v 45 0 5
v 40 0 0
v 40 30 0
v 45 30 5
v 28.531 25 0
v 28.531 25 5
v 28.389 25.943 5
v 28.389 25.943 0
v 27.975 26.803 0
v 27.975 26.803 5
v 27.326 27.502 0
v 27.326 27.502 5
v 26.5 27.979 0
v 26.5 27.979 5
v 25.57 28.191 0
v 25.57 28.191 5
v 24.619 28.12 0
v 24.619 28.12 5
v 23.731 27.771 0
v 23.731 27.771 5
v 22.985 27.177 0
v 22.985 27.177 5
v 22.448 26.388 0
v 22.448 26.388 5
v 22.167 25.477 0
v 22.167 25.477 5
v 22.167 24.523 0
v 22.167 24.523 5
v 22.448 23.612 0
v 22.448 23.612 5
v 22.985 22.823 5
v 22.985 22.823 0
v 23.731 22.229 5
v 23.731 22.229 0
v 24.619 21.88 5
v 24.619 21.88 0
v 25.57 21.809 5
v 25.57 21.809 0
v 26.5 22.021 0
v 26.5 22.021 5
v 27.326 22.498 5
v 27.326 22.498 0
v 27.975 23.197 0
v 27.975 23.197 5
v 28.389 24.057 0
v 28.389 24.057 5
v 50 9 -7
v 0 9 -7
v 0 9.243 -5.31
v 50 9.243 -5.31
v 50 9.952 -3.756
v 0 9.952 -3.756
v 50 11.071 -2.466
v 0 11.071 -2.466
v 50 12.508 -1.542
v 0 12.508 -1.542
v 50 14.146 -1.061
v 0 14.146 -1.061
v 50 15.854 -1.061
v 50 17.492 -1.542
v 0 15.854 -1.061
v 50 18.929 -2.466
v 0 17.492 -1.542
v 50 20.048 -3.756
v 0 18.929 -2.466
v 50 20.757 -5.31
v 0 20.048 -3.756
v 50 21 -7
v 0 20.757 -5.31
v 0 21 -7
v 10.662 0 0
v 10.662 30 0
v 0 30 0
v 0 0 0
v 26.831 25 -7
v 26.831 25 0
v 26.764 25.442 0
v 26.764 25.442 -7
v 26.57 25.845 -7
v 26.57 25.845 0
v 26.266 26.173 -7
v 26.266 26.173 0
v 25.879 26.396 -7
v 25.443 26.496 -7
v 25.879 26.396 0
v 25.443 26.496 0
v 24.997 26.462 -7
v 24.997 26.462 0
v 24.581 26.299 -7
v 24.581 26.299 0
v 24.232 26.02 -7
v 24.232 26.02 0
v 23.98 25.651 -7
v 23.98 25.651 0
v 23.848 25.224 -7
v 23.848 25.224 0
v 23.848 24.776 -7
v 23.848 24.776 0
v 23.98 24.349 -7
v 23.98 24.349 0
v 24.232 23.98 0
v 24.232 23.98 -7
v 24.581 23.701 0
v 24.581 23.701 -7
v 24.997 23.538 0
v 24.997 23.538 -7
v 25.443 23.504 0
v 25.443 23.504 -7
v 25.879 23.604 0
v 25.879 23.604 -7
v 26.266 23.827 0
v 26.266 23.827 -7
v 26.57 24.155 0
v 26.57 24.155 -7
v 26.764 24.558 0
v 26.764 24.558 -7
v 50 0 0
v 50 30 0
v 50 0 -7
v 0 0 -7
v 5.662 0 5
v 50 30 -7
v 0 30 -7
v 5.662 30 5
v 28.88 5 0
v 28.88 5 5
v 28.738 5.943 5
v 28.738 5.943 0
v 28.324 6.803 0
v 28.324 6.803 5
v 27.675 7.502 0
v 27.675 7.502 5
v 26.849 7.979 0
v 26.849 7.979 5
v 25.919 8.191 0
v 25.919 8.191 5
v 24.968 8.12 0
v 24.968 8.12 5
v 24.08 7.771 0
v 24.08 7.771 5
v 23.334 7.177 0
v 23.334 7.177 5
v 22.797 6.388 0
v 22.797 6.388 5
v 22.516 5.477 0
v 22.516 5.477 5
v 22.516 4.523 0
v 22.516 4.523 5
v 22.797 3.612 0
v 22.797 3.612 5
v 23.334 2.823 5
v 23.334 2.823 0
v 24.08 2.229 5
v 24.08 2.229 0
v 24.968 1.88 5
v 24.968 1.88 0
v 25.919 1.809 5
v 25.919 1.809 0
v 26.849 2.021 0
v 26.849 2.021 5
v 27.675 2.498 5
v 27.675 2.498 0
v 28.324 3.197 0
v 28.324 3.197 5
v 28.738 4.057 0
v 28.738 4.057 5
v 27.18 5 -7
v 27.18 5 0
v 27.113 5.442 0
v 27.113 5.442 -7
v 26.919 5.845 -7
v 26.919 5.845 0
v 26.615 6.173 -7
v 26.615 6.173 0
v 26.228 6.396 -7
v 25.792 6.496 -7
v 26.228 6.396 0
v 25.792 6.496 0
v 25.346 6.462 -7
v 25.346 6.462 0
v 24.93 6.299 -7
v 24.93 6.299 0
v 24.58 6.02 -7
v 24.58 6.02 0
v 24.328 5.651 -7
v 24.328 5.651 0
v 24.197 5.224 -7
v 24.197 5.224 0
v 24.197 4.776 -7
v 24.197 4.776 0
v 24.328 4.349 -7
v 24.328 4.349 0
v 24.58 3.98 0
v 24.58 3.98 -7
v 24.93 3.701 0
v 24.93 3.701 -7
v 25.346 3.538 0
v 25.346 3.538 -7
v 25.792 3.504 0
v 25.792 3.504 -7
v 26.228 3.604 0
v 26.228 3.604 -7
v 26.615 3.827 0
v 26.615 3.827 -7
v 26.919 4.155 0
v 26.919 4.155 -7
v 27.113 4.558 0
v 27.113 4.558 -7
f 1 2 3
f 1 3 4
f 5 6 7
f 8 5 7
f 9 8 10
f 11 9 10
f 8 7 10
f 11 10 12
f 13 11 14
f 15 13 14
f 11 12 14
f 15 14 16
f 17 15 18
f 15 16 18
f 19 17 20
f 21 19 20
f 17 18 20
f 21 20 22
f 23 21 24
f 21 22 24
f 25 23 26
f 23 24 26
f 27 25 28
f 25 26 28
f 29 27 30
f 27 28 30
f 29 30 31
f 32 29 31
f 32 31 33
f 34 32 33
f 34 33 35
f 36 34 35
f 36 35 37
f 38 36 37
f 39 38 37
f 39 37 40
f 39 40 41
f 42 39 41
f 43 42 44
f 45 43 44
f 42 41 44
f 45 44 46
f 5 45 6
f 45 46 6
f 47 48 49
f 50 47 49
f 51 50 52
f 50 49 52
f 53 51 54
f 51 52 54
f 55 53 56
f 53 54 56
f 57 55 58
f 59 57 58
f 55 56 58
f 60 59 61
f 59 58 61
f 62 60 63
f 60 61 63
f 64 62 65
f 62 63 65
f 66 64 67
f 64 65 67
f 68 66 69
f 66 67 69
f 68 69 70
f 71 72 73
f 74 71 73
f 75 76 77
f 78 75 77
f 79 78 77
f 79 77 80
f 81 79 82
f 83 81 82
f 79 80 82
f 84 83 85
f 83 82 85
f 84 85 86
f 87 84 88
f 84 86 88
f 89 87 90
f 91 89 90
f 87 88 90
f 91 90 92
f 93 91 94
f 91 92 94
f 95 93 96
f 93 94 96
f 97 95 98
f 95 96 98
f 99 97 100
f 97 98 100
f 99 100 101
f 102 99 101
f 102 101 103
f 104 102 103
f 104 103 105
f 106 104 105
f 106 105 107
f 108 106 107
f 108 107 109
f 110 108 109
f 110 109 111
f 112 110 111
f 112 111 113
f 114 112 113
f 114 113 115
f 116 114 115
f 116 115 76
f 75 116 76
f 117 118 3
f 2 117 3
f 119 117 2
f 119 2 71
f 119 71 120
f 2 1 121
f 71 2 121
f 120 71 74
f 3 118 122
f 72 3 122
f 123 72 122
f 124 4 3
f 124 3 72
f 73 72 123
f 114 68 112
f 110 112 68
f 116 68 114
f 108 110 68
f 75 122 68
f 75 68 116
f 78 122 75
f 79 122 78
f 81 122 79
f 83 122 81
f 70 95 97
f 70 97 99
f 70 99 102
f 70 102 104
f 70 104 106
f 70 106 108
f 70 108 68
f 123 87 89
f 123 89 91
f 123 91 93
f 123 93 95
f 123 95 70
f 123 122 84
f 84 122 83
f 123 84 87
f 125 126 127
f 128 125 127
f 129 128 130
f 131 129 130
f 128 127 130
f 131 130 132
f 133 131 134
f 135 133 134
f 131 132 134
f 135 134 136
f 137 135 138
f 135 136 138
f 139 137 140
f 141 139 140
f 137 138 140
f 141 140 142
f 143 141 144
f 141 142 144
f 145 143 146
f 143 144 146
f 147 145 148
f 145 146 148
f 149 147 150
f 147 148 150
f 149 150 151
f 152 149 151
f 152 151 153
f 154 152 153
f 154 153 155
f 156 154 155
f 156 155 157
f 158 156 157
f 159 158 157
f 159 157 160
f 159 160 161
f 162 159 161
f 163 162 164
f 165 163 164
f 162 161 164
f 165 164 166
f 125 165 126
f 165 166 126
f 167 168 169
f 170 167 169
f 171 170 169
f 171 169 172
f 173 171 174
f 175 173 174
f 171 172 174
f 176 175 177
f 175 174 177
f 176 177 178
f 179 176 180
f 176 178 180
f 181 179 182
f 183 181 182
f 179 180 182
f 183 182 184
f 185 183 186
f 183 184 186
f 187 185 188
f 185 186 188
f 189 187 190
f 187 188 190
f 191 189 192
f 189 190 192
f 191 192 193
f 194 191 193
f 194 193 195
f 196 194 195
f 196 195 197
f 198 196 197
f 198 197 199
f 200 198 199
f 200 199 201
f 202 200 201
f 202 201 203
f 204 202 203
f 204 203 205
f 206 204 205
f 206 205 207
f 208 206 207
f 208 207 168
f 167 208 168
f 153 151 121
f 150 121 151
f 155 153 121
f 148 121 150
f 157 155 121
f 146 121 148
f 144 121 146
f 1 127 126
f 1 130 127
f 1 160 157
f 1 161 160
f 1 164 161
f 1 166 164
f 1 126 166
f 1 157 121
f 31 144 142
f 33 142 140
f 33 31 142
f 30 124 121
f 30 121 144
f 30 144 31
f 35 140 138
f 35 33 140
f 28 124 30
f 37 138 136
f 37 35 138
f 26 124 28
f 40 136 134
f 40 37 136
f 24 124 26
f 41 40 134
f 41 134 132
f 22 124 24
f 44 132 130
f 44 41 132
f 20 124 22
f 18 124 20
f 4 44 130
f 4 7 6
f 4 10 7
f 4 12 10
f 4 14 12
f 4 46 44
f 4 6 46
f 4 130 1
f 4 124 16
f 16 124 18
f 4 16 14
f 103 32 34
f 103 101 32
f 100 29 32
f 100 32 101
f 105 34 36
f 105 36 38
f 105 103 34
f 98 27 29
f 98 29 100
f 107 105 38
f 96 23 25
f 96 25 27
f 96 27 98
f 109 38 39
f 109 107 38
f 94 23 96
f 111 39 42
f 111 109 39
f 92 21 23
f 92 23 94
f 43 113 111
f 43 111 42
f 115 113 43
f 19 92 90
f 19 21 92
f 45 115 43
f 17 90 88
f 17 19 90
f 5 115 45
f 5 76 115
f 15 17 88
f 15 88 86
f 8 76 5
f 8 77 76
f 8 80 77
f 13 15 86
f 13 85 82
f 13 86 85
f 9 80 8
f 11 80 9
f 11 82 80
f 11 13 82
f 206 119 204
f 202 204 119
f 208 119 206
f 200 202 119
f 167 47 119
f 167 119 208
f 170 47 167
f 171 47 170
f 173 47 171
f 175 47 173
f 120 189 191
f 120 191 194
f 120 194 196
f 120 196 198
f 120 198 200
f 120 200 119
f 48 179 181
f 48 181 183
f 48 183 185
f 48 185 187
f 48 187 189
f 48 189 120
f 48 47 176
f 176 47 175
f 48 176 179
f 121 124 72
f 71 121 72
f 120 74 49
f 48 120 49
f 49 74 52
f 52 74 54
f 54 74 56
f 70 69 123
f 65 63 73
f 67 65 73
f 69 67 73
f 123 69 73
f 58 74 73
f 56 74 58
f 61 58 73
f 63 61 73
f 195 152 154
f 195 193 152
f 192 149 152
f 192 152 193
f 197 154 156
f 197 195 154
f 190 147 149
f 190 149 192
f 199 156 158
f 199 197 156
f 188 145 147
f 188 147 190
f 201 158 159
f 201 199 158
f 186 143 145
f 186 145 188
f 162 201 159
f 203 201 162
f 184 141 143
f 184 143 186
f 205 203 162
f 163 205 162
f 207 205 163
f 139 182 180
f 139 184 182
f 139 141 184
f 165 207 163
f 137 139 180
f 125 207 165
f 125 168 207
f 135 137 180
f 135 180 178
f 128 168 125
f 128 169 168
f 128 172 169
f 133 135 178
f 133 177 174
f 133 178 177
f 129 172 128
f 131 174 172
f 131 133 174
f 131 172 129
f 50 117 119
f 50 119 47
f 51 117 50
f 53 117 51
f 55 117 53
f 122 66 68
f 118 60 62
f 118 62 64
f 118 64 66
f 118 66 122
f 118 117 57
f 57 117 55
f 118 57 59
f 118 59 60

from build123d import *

# Parameters (mm, degrees)
SKETCH_1_W            = 50
SKETCH_1_H            = 30
EXTRUDE_320_DEPTH     = 5
CUT_EXTRUDE_710_DEPTH = 31
SKETCH_8_W            = 50
SKETCH_8_H            = 30
EXTRUDE_1_DEPTH       = 2
SKETCH_11_R           = 6
CUT_EXTRUDE_2_DEPTH   = 51
SKETCH_12_R           = 1.5
CUT_EXTRUDE_3_DEPTH   = 13
SKETCH_12_3_R         = 3.2
CUT_EXTRUDE_4_DEPTH   = 5


with BuildPart() as part:
    # Эскиз1 → Extrude 320 (new body, symmetric)
    with BuildSketch(Plane.XY):
        with Locations((25, 15)):
            Rectangle(SKETCH_1_W, SKETCH_1_H)
    extrude(amount=EXTRUDE_320_DEPTH, both=True)

    # Эскиз2 → Cut-Extrude 710 (cut, through all)
    with BuildSketch(Plane(origin=(0, 30, 0), x_dir=(1, 0, 0), z_dir=(0, 1, 0))):
        Polygon((10.662267101, 0), (0, 0), (0, -5), (5.662267101, -5), align=None)
        Polygon((40, 0), (45, -5), (50, -5), (50, 0), align=None)
    extrude(amount=-CUT_EXTRUDE_710_DEPTH, mode=Mode.SUBTRACT)

    # Эскиз8 → Бобышка-Вытянуть1 (add)
    with BuildSketch(Plane(origin=(0, 0, -5), x_dir=(-1, 0, 0), z_dir=(0, 0, -1))):
        with Locations((-25, 15)):
            Rectangle(SKETCH_8_W, SKETCH_8_H)
    extrude(amount=EXTRUDE_1_DEPTH)

    # Эскиз11 → Вырез-Вытянуть2 (cut, through all)
    with BuildSketch(Plane.ZY):
        with Locations((-7, 15)):
            Circle(SKETCH_11_R)
    extrude(amount=-CUT_EXTRUDE_2_DEPTH, mode=Mode.SUBTRACT)

    # Эскиз12 → Вырез-Вытянуть3 (cut, through all)
    with BuildSketch(Plane.XY.offset(5)):
        with Locations((25.679943924, 5)):
            Circle(SKETCH_12_R)
        with Locations((25.331133551, 25)):
            Circle(SKETCH_12_R)
    extrude(amount=-CUT_EXTRUDE_3_DEPTH, mode=Mode.SUBTRACT)

    # Эскиз12<3> → Вырез-Вытянуть4 (cut)
    with BuildSketch(Plane.XY.offset(5)):
        with Locations((25.331133551, 25)):
            Circle(SKETCH_12_3_R)
        with Locations((25.679943924, 5)):
            Circle(SKETCH_12_3_R)
    extrude(amount=-CUT_EXTRUDE_4_DEPTH, mode=Mode.SUBTRACT)


solid = part.part
